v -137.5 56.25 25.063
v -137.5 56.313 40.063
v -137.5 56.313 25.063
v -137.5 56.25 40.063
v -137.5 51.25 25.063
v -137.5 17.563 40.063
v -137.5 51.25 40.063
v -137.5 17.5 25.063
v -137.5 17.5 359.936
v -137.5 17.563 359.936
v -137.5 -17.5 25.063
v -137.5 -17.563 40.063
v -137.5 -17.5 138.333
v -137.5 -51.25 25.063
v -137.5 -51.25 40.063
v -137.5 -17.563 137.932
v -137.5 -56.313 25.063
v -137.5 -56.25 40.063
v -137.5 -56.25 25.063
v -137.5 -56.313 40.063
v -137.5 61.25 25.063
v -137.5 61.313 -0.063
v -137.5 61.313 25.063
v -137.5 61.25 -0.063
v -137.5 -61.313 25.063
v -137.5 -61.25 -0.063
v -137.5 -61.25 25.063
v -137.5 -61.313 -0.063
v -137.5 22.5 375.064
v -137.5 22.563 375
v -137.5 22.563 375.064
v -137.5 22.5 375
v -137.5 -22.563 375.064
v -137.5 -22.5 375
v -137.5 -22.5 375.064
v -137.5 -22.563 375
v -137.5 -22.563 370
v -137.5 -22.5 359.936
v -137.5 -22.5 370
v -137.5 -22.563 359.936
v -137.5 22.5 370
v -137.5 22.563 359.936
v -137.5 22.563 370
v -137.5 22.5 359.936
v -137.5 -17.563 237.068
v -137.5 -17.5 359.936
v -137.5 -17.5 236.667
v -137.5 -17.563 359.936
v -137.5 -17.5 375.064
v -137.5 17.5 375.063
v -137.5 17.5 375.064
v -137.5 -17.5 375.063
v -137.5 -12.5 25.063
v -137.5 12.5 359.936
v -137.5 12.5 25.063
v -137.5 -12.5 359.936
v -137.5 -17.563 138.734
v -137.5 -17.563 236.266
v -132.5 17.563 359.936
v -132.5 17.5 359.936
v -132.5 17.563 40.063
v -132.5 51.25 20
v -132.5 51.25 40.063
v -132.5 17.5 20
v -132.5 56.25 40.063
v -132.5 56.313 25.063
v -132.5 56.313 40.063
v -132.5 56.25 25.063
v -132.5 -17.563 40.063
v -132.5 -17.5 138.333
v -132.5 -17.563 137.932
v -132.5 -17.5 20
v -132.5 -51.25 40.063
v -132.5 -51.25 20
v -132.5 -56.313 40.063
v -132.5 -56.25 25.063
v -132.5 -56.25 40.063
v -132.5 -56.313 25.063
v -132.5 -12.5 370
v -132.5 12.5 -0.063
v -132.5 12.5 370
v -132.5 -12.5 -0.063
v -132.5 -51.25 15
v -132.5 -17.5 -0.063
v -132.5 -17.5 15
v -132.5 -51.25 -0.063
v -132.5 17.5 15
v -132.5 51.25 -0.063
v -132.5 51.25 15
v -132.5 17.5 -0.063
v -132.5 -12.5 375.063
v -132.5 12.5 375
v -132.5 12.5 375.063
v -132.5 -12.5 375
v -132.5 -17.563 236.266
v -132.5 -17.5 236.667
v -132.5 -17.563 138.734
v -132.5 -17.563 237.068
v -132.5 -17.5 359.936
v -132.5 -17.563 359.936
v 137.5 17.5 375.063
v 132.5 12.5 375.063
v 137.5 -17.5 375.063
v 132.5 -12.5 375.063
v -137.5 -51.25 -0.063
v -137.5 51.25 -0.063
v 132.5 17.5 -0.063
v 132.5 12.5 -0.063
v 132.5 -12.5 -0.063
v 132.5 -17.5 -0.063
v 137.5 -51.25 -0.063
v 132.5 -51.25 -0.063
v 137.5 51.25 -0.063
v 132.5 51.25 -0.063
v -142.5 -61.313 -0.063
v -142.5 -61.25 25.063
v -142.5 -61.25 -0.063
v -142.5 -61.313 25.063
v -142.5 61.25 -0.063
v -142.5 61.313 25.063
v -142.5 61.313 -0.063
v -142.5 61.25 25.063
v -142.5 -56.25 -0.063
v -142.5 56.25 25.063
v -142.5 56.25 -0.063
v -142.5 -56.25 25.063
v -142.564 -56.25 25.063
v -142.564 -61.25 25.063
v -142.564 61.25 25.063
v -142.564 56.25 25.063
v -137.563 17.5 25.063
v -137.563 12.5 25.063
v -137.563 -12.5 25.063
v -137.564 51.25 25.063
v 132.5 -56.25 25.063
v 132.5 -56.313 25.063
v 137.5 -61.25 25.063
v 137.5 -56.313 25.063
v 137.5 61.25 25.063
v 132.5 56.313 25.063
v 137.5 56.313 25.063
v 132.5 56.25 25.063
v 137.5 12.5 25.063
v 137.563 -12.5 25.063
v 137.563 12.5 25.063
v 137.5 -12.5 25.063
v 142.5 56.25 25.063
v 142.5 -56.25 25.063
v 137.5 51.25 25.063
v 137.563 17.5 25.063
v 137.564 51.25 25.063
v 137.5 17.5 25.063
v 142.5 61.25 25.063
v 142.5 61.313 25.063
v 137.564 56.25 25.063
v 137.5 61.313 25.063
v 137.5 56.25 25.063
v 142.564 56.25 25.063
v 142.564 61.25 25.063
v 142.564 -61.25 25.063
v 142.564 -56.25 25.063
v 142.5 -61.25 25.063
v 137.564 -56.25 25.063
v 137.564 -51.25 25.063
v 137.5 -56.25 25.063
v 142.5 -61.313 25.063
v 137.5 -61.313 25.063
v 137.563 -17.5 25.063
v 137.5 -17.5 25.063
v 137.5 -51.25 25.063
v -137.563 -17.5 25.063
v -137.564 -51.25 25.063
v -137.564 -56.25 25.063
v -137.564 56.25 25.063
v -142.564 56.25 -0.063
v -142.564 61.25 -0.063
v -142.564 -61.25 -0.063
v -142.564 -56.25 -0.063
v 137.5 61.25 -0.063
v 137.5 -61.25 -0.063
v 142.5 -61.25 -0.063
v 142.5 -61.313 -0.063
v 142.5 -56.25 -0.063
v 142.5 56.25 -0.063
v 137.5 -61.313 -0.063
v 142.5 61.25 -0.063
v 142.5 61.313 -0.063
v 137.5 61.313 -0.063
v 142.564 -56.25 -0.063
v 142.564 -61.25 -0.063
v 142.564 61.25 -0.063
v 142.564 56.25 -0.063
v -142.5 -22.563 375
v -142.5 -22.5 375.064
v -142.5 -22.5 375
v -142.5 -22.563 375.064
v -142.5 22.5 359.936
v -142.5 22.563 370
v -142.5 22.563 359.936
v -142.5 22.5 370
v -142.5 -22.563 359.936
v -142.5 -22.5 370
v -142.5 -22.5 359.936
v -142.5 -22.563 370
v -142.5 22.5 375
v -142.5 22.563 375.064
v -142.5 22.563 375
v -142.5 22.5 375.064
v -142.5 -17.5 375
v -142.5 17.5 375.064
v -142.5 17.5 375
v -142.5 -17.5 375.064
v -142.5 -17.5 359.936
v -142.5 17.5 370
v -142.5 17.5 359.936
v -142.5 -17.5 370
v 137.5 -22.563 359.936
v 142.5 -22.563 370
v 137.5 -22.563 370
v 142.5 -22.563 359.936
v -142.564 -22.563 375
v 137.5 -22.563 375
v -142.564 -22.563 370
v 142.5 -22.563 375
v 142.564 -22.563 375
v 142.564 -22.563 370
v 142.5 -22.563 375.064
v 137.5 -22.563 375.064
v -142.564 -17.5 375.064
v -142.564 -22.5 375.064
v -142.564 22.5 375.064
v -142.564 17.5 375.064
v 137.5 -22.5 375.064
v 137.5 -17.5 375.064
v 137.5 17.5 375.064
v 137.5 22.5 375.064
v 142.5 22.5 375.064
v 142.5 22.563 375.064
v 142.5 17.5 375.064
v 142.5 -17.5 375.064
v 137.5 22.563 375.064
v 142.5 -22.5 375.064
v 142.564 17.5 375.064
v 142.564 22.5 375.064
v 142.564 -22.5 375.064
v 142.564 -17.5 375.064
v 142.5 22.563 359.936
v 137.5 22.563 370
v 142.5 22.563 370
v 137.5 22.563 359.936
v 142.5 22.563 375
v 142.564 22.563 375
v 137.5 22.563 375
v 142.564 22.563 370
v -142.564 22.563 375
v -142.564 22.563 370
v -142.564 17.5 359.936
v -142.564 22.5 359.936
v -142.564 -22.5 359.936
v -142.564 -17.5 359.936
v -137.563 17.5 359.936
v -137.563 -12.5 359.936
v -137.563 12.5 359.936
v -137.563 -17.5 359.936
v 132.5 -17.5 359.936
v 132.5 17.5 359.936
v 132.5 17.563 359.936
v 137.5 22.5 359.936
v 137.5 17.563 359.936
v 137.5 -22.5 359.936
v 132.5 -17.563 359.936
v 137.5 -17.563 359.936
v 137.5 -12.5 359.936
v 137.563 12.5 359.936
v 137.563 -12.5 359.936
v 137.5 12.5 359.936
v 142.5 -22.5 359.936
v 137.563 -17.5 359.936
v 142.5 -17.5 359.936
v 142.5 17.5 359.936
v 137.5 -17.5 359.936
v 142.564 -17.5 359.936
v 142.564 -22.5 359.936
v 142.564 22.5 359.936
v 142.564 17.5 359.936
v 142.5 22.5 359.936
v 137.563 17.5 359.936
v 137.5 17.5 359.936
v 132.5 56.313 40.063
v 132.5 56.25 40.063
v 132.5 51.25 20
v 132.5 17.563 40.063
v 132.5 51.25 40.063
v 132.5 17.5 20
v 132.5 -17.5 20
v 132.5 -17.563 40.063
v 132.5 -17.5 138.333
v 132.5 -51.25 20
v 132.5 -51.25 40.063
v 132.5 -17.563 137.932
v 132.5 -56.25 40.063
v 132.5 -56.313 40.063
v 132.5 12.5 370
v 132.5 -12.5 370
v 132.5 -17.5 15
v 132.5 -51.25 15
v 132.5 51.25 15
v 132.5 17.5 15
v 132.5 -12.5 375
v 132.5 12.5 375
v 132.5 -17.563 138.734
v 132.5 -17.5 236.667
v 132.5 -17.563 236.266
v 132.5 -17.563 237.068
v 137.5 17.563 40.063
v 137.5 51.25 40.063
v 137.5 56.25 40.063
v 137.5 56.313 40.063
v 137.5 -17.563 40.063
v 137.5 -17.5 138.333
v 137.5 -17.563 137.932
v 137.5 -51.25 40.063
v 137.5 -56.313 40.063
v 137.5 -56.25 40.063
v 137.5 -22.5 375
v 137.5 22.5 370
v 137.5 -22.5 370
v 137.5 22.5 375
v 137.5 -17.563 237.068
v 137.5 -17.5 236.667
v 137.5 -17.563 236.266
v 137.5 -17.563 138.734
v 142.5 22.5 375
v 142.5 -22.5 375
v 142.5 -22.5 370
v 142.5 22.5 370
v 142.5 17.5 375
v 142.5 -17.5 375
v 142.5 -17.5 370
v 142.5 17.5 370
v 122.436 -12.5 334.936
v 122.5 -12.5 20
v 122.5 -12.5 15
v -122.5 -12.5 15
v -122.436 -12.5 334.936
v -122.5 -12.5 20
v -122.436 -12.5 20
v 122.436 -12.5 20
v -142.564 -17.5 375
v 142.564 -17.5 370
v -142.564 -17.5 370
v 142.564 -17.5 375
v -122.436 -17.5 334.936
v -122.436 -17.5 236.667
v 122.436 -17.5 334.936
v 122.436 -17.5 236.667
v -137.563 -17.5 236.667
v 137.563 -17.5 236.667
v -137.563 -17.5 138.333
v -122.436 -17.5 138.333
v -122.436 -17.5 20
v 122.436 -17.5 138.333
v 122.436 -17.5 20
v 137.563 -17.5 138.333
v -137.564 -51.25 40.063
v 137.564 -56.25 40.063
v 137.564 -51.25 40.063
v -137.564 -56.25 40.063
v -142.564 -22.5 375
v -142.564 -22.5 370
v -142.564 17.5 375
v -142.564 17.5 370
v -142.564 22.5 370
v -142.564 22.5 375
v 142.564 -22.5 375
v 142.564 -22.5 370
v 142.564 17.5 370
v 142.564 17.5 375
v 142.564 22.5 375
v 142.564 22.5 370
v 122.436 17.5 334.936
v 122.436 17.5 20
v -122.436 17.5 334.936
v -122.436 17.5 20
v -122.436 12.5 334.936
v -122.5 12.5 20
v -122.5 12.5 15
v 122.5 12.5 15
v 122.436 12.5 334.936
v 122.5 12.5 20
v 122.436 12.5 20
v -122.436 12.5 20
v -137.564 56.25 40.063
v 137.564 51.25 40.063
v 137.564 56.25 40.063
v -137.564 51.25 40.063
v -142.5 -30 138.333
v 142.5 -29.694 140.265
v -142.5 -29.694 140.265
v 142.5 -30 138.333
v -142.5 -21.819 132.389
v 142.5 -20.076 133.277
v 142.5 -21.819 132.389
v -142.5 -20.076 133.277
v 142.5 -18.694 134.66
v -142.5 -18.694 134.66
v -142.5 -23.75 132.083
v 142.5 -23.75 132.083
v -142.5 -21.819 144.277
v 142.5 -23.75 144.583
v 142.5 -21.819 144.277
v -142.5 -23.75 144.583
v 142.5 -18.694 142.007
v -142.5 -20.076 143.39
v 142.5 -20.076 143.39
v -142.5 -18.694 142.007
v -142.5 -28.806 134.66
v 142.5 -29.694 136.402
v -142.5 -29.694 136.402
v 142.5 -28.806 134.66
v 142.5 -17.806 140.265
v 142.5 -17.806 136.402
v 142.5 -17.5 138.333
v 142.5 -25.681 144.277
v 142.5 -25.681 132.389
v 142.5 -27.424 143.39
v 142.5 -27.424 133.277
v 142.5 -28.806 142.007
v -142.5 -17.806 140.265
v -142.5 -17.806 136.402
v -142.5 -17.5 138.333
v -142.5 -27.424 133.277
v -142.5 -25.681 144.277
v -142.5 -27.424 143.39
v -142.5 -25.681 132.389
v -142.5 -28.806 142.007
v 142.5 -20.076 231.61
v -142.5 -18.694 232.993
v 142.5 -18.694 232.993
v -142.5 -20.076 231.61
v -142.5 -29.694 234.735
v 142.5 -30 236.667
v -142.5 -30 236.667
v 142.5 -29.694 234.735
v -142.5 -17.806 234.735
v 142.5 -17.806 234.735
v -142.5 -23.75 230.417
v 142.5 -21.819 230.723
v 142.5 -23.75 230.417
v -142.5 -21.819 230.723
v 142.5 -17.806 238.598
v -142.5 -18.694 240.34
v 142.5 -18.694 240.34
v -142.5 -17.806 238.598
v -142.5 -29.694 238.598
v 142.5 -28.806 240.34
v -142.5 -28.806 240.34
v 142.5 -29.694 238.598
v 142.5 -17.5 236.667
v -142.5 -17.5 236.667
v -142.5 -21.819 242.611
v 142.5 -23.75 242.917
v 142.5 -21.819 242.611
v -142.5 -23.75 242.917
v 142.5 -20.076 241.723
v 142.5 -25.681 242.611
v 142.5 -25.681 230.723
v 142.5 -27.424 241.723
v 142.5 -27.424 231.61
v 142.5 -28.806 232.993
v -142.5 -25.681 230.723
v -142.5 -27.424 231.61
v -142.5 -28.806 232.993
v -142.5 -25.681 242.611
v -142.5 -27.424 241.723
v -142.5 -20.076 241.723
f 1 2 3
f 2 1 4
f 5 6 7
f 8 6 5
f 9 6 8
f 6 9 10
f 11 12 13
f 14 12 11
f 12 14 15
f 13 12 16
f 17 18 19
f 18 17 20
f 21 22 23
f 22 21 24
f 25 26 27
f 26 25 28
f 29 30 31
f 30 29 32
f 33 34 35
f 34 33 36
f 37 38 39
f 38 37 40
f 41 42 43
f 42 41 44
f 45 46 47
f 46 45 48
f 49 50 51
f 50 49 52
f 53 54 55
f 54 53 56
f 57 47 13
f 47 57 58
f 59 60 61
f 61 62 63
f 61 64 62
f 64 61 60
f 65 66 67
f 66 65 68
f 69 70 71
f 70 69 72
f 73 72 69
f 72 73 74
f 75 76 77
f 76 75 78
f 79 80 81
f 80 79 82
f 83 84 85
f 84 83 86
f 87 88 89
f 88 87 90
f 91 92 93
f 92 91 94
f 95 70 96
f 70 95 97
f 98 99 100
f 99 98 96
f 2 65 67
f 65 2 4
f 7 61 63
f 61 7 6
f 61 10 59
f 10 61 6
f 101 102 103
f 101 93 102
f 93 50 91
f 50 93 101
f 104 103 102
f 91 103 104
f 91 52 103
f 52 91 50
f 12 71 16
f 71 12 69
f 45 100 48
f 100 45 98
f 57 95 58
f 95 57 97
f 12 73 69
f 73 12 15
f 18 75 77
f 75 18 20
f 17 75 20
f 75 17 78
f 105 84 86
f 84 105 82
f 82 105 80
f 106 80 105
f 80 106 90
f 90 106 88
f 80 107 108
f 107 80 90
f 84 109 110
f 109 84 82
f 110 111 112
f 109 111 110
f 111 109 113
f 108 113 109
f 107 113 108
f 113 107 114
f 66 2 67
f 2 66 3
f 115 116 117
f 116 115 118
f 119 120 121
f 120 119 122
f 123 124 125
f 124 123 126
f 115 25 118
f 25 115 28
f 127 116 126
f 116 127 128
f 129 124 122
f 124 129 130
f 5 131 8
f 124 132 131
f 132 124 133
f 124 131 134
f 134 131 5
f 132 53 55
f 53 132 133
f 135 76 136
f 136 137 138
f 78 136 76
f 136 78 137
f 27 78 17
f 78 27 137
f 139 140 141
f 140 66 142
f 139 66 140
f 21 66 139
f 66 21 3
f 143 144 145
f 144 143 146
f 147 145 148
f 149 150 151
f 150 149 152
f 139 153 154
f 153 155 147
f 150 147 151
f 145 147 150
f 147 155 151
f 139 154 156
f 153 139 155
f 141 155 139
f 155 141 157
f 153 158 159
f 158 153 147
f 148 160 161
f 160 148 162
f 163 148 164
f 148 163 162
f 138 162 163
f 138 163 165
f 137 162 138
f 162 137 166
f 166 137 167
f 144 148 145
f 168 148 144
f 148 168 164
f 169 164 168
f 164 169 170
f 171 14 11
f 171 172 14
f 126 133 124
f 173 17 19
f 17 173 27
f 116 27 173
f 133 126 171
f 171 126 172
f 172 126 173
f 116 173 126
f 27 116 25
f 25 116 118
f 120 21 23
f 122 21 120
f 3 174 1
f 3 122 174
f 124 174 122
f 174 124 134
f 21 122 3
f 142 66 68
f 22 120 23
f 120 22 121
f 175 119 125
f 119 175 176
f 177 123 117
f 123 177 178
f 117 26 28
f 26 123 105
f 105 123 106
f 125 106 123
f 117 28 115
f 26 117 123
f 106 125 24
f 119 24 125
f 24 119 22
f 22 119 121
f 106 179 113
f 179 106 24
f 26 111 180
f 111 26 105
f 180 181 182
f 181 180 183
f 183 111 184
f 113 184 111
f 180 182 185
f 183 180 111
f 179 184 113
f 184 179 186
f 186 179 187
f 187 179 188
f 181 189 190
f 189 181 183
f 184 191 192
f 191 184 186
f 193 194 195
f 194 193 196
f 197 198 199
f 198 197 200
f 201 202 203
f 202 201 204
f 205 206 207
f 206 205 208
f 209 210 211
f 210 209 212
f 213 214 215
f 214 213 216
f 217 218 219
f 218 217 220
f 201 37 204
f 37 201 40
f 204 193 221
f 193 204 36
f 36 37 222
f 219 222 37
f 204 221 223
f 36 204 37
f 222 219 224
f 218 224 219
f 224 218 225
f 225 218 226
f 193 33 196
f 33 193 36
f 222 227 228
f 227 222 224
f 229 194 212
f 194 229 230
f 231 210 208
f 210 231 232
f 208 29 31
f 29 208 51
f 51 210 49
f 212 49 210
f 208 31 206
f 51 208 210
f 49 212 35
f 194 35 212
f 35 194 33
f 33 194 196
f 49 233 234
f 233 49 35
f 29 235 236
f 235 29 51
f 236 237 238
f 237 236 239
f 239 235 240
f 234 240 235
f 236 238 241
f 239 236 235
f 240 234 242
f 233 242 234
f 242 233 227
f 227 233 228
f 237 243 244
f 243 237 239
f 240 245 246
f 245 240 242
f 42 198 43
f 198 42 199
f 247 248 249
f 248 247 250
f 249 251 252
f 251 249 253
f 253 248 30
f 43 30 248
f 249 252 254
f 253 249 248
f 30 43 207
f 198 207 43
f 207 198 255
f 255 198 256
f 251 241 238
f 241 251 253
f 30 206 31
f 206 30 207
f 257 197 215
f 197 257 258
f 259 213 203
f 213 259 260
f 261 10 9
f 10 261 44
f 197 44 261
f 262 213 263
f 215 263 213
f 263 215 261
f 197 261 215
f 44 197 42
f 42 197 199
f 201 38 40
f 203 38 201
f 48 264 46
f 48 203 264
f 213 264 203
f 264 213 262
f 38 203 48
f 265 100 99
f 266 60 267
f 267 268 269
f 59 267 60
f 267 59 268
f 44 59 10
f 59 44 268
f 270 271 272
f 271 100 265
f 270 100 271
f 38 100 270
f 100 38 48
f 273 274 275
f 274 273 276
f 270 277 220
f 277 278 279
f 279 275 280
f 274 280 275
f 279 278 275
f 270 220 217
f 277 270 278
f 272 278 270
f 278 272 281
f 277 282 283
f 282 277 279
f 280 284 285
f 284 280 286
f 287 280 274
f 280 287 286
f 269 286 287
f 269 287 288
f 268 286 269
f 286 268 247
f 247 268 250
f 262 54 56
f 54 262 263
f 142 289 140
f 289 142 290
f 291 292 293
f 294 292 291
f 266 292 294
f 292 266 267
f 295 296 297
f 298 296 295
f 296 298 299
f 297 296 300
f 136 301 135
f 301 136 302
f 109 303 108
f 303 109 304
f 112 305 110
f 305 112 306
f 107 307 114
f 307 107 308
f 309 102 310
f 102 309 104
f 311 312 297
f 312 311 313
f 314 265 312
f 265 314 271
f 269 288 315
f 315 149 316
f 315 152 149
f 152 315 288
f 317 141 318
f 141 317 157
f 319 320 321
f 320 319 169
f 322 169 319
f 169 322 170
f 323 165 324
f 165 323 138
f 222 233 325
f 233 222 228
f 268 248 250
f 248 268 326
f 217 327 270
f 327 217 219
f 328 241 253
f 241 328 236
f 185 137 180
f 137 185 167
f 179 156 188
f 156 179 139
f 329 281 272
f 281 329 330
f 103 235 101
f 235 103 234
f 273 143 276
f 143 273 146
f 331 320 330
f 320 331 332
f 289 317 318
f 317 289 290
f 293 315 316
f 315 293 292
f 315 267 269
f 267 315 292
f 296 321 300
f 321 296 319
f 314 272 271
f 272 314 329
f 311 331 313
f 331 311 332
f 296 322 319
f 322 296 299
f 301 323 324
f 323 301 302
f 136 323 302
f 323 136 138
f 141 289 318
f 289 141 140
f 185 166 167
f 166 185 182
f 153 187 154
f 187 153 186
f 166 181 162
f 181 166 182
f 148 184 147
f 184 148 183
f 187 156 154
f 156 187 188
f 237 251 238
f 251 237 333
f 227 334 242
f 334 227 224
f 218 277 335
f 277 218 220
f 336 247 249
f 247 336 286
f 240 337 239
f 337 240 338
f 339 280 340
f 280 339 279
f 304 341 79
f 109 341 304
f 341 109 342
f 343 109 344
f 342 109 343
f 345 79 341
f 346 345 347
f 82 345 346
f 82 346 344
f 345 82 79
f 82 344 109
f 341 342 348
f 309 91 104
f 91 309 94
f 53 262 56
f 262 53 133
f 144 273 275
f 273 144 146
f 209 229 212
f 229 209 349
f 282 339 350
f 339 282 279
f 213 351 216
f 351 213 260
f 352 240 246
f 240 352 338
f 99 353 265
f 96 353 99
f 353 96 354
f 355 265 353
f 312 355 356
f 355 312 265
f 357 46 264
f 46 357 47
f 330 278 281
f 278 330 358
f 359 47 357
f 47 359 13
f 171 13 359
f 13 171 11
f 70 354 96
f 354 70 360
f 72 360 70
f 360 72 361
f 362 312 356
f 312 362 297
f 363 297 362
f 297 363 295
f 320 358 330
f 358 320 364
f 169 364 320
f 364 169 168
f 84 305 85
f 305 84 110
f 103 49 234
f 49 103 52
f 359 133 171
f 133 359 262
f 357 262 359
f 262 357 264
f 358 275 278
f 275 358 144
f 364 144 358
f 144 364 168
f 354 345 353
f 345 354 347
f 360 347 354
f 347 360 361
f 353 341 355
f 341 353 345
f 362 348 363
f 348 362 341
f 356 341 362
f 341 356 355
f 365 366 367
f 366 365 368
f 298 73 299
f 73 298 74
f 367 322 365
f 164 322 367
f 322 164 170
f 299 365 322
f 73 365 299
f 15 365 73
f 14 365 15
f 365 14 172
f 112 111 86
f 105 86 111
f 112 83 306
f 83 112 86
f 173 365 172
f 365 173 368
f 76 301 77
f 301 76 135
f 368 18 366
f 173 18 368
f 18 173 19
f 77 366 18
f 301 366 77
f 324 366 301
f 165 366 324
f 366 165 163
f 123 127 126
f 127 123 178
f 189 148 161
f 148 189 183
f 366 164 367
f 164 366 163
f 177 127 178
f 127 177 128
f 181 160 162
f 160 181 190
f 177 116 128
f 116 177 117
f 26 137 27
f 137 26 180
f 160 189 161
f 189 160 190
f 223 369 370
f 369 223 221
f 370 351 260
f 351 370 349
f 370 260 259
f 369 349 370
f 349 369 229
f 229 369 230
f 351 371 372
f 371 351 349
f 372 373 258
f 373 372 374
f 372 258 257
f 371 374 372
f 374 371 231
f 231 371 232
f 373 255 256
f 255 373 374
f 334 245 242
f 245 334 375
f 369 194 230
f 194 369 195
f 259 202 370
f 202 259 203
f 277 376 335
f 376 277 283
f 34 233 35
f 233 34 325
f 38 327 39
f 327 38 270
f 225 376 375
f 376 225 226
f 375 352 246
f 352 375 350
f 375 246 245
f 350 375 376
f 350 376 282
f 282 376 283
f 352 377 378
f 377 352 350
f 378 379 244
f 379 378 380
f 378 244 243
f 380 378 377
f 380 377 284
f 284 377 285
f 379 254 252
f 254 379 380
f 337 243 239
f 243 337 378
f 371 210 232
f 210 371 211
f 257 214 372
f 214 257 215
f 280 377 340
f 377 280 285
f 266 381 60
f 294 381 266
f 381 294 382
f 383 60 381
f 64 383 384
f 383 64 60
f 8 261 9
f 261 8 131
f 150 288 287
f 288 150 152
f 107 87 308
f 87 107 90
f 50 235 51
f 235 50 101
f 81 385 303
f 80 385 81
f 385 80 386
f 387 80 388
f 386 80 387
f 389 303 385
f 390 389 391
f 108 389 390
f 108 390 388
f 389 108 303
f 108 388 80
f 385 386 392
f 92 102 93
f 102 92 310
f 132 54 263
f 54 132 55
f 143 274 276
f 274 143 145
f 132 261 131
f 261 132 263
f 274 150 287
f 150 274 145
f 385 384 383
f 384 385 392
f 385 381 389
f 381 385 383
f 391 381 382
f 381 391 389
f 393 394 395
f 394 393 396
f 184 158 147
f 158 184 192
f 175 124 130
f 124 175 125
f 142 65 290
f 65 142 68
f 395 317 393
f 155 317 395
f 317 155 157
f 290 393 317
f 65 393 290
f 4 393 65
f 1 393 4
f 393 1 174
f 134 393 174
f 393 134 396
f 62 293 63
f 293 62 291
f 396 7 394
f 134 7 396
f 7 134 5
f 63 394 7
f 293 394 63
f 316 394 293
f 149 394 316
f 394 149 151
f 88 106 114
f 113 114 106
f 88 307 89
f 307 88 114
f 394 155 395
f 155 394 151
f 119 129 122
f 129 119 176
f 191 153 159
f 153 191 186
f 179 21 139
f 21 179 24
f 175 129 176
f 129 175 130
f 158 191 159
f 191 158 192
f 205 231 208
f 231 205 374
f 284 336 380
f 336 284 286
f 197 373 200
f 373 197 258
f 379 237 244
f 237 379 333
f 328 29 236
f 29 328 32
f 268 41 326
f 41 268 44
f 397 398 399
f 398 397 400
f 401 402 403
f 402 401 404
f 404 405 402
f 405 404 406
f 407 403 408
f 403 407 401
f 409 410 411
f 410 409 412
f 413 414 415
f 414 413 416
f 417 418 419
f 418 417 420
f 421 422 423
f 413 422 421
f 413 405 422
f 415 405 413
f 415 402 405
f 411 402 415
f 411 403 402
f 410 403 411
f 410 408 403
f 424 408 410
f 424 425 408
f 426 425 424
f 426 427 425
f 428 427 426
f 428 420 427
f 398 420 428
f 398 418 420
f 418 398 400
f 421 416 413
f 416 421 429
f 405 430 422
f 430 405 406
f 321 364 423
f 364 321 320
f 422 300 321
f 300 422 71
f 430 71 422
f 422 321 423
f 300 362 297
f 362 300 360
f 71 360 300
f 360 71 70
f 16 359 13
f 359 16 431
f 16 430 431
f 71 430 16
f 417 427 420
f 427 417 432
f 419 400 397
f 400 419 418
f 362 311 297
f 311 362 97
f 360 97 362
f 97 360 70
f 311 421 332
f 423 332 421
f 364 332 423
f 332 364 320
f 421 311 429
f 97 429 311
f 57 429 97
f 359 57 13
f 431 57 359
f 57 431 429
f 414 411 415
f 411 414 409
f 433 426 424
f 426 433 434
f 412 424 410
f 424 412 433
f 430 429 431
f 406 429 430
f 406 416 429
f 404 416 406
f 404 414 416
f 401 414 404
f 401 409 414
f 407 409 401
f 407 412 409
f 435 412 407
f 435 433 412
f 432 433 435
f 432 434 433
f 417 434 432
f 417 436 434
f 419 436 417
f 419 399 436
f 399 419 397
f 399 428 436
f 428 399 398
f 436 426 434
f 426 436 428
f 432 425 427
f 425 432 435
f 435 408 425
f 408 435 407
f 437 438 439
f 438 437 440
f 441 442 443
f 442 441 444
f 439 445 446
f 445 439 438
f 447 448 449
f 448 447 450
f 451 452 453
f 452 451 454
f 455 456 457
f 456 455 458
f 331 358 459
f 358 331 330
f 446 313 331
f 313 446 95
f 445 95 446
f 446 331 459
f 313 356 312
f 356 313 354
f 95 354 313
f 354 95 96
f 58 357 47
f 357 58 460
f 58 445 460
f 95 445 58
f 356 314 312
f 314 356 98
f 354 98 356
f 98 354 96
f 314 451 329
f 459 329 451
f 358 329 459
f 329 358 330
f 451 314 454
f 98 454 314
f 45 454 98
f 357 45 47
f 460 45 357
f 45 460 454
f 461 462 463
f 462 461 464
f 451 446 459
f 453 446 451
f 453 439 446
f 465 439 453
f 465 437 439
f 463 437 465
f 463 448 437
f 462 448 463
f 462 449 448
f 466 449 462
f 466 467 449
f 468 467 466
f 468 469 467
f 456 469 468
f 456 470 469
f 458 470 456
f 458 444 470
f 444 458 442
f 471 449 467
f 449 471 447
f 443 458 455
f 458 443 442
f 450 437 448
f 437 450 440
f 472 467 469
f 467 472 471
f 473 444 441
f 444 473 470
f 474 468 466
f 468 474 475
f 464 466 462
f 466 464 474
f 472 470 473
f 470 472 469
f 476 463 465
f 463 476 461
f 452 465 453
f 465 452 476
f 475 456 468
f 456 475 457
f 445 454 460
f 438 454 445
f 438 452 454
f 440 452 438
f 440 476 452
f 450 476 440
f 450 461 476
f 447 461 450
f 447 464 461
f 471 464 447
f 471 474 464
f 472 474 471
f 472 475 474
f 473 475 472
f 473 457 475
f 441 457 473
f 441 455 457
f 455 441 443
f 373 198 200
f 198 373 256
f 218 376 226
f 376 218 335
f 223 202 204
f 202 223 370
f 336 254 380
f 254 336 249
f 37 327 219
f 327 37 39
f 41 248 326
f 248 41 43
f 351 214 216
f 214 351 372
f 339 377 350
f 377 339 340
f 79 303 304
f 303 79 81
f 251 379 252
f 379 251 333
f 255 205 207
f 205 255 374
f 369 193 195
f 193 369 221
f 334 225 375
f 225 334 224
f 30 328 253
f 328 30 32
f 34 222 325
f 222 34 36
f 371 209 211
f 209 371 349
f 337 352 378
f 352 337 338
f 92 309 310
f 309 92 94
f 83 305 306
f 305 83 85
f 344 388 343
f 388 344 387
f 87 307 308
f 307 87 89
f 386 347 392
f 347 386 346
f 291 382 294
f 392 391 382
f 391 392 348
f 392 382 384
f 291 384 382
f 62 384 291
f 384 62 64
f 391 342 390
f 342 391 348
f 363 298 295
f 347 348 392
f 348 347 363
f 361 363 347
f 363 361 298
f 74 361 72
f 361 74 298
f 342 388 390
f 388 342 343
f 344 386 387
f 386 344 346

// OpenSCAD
t = 5;
l = 0.005 * 25.4;

h = 15 * 25;
w = 11 * 25;
d = 4.5 * 25;
skinny_d = 35;

foot_height = 15;
foot_width = 25;
tray_height = 25;
top_height = 25;
molding_height = 15;

frame_width = 15;

dowel_d = 12.5; // half inch dowel

//\             / molding_height }
// -------------                  |
// |           | top_height       |
// -------------                  |
// |           |                  |
// |           |                  |
// |           |                  |
// =============                  |
// |           |                   }
// |           |                    } h
// |           |                   }
// =============                  |
// |           |                  |
// |           |                  |
// |           |                  |
// -------------                  |
// |           | tray_height      |
// -------------                  |
// -------------                  |
// | /       \ | foot_height     }

module _xy() {
  color("blue") linear_extrude(height=t, center=true) child(0);
}

module _xz() {
  color("red") rotate([90, 0, 0]) linear_extrude(height=t, center=true) child(0);
}

module _yz() {
  color("green") rotate([90, 0, 90]) linear_extrude(height=t, center=true) child(0);
}

// todo: cut out dowel slots
module pillar() {
  union() {
    translate([0, h/2, 0]) 
      square(size=[skinny_d+l, h+l], center=true);
    translate([0, (foot_height + tray_height)/2, 0]) 
      square(size=[d+l, foot_height + tray_height + l], center=true);
  }
}

// todo: add top hanger peg holes
// todo: add cutouts for dowels
module frame() {
  difference() {
    translate([0, h/2, 0]) square(size=[w+l, h+l], center=true);
    translate([0, h/2 - tray_height/2, 0]) square(size=[w - 2 * frame_width - l, h - top_height - molding_height - foot_height - l], center=true);
  }
}

module tray_bottom() {
  assign(width = w - 2 * t)
  difference() {
    square(size=[width+l, d-2*t+l], center=true);
    for (x=[-1,1]) {
      translate([width / 2 * x, 0, 0]) square(size=[(frame_width-t) * 2, skinny_d - l], center=true);
    }
    
  }
}

module top() {
  square(size=[w+2*t+l, skinny_d+2*t+l], center=true);
}

// todo: curve out the bottom
module frontback_inner() {
  assign(height = tray_height + foot_height){
    translate([0, height/2, 0]) 
      square(size=[w+l, height + l], center=true);
  }
}

module bottom_frontback_veneer() {
  assign(height = tray_height + foot_height - molding_height){
    translate([0, height/2, 0]) 
      square(size=[w+2*t+l, height + l], center=true);
  }
}

module bottom_leftright_veneer() {
  assign(height = tray_height + foot_height - molding_height){
    translate([0, height/2, 0]) 
      square(size=[d+2*t+l, height + l], center=true);
  }
}

module top_frontback_veneer() {
  assign(height = molding_height){
    translate([0, height/2, 0]) 
      square(size=[w+2*t+l, height + l], center=true);
  }
}

module top_leftright_veneer() {
  assign(height = molding_height){
    translate([0, height/2, 0]) 
      square(size=[skinny_d+2*t+l, height + l], center=true);
  }
}

module dowel() {
  cylinder(r=dowel_d/2, h=w+2*t, center=true);
}

module assembled() {
  for (x=[-1,1]) {
    translate([(w/2 - t/2) * x, 0, 0]) _yz() pillar();
    translate([(w/2 + t/2) * x, 0, 0]) _yz() bottom_leftright_veneer();
    translate([(w/2 + t/2) * x, 0, h-molding_height]) 
      _yz() top_leftright_veneer();
  }

  for (y=[-1,1]) {
    translate([0, (skinny_d/2-t/2) * y, 0]) _xz() frame();
    translate([0, (d / 2 - t/2) * y, 0]) _xz() frontback_inner();
    translate([0, (d / 2 + t/2) * y, 0]) _xz() bottom_frontback_veneer();
    translate([0, (skinny_d / 2 + t/2) * y, h - molding_height]) 
      _xz() top_frontback_veneer();
  }

  translate([0, 0, h-t/2]) _xy() top();
  translate([0, 0, foot_height+t/2]) _xy() tray_bottom();
  
  assign(bottom = foot_height + tray_height)
  assign(hanging_h = h - foot_height - tray_height - top_height - molding_height)
  translate([0, -skinny_d/2 - dowel_d/2, 0]) {
    translate([0, 0, bottom + hanging_h / 3]) 
      rotate([0, 90, 0]) dowel();
    translate([0, 0, bottom + hanging_h / 3 * 2]) 
      rotate([0, 90, 0]) dowel();
  }
  
}

assembled();
